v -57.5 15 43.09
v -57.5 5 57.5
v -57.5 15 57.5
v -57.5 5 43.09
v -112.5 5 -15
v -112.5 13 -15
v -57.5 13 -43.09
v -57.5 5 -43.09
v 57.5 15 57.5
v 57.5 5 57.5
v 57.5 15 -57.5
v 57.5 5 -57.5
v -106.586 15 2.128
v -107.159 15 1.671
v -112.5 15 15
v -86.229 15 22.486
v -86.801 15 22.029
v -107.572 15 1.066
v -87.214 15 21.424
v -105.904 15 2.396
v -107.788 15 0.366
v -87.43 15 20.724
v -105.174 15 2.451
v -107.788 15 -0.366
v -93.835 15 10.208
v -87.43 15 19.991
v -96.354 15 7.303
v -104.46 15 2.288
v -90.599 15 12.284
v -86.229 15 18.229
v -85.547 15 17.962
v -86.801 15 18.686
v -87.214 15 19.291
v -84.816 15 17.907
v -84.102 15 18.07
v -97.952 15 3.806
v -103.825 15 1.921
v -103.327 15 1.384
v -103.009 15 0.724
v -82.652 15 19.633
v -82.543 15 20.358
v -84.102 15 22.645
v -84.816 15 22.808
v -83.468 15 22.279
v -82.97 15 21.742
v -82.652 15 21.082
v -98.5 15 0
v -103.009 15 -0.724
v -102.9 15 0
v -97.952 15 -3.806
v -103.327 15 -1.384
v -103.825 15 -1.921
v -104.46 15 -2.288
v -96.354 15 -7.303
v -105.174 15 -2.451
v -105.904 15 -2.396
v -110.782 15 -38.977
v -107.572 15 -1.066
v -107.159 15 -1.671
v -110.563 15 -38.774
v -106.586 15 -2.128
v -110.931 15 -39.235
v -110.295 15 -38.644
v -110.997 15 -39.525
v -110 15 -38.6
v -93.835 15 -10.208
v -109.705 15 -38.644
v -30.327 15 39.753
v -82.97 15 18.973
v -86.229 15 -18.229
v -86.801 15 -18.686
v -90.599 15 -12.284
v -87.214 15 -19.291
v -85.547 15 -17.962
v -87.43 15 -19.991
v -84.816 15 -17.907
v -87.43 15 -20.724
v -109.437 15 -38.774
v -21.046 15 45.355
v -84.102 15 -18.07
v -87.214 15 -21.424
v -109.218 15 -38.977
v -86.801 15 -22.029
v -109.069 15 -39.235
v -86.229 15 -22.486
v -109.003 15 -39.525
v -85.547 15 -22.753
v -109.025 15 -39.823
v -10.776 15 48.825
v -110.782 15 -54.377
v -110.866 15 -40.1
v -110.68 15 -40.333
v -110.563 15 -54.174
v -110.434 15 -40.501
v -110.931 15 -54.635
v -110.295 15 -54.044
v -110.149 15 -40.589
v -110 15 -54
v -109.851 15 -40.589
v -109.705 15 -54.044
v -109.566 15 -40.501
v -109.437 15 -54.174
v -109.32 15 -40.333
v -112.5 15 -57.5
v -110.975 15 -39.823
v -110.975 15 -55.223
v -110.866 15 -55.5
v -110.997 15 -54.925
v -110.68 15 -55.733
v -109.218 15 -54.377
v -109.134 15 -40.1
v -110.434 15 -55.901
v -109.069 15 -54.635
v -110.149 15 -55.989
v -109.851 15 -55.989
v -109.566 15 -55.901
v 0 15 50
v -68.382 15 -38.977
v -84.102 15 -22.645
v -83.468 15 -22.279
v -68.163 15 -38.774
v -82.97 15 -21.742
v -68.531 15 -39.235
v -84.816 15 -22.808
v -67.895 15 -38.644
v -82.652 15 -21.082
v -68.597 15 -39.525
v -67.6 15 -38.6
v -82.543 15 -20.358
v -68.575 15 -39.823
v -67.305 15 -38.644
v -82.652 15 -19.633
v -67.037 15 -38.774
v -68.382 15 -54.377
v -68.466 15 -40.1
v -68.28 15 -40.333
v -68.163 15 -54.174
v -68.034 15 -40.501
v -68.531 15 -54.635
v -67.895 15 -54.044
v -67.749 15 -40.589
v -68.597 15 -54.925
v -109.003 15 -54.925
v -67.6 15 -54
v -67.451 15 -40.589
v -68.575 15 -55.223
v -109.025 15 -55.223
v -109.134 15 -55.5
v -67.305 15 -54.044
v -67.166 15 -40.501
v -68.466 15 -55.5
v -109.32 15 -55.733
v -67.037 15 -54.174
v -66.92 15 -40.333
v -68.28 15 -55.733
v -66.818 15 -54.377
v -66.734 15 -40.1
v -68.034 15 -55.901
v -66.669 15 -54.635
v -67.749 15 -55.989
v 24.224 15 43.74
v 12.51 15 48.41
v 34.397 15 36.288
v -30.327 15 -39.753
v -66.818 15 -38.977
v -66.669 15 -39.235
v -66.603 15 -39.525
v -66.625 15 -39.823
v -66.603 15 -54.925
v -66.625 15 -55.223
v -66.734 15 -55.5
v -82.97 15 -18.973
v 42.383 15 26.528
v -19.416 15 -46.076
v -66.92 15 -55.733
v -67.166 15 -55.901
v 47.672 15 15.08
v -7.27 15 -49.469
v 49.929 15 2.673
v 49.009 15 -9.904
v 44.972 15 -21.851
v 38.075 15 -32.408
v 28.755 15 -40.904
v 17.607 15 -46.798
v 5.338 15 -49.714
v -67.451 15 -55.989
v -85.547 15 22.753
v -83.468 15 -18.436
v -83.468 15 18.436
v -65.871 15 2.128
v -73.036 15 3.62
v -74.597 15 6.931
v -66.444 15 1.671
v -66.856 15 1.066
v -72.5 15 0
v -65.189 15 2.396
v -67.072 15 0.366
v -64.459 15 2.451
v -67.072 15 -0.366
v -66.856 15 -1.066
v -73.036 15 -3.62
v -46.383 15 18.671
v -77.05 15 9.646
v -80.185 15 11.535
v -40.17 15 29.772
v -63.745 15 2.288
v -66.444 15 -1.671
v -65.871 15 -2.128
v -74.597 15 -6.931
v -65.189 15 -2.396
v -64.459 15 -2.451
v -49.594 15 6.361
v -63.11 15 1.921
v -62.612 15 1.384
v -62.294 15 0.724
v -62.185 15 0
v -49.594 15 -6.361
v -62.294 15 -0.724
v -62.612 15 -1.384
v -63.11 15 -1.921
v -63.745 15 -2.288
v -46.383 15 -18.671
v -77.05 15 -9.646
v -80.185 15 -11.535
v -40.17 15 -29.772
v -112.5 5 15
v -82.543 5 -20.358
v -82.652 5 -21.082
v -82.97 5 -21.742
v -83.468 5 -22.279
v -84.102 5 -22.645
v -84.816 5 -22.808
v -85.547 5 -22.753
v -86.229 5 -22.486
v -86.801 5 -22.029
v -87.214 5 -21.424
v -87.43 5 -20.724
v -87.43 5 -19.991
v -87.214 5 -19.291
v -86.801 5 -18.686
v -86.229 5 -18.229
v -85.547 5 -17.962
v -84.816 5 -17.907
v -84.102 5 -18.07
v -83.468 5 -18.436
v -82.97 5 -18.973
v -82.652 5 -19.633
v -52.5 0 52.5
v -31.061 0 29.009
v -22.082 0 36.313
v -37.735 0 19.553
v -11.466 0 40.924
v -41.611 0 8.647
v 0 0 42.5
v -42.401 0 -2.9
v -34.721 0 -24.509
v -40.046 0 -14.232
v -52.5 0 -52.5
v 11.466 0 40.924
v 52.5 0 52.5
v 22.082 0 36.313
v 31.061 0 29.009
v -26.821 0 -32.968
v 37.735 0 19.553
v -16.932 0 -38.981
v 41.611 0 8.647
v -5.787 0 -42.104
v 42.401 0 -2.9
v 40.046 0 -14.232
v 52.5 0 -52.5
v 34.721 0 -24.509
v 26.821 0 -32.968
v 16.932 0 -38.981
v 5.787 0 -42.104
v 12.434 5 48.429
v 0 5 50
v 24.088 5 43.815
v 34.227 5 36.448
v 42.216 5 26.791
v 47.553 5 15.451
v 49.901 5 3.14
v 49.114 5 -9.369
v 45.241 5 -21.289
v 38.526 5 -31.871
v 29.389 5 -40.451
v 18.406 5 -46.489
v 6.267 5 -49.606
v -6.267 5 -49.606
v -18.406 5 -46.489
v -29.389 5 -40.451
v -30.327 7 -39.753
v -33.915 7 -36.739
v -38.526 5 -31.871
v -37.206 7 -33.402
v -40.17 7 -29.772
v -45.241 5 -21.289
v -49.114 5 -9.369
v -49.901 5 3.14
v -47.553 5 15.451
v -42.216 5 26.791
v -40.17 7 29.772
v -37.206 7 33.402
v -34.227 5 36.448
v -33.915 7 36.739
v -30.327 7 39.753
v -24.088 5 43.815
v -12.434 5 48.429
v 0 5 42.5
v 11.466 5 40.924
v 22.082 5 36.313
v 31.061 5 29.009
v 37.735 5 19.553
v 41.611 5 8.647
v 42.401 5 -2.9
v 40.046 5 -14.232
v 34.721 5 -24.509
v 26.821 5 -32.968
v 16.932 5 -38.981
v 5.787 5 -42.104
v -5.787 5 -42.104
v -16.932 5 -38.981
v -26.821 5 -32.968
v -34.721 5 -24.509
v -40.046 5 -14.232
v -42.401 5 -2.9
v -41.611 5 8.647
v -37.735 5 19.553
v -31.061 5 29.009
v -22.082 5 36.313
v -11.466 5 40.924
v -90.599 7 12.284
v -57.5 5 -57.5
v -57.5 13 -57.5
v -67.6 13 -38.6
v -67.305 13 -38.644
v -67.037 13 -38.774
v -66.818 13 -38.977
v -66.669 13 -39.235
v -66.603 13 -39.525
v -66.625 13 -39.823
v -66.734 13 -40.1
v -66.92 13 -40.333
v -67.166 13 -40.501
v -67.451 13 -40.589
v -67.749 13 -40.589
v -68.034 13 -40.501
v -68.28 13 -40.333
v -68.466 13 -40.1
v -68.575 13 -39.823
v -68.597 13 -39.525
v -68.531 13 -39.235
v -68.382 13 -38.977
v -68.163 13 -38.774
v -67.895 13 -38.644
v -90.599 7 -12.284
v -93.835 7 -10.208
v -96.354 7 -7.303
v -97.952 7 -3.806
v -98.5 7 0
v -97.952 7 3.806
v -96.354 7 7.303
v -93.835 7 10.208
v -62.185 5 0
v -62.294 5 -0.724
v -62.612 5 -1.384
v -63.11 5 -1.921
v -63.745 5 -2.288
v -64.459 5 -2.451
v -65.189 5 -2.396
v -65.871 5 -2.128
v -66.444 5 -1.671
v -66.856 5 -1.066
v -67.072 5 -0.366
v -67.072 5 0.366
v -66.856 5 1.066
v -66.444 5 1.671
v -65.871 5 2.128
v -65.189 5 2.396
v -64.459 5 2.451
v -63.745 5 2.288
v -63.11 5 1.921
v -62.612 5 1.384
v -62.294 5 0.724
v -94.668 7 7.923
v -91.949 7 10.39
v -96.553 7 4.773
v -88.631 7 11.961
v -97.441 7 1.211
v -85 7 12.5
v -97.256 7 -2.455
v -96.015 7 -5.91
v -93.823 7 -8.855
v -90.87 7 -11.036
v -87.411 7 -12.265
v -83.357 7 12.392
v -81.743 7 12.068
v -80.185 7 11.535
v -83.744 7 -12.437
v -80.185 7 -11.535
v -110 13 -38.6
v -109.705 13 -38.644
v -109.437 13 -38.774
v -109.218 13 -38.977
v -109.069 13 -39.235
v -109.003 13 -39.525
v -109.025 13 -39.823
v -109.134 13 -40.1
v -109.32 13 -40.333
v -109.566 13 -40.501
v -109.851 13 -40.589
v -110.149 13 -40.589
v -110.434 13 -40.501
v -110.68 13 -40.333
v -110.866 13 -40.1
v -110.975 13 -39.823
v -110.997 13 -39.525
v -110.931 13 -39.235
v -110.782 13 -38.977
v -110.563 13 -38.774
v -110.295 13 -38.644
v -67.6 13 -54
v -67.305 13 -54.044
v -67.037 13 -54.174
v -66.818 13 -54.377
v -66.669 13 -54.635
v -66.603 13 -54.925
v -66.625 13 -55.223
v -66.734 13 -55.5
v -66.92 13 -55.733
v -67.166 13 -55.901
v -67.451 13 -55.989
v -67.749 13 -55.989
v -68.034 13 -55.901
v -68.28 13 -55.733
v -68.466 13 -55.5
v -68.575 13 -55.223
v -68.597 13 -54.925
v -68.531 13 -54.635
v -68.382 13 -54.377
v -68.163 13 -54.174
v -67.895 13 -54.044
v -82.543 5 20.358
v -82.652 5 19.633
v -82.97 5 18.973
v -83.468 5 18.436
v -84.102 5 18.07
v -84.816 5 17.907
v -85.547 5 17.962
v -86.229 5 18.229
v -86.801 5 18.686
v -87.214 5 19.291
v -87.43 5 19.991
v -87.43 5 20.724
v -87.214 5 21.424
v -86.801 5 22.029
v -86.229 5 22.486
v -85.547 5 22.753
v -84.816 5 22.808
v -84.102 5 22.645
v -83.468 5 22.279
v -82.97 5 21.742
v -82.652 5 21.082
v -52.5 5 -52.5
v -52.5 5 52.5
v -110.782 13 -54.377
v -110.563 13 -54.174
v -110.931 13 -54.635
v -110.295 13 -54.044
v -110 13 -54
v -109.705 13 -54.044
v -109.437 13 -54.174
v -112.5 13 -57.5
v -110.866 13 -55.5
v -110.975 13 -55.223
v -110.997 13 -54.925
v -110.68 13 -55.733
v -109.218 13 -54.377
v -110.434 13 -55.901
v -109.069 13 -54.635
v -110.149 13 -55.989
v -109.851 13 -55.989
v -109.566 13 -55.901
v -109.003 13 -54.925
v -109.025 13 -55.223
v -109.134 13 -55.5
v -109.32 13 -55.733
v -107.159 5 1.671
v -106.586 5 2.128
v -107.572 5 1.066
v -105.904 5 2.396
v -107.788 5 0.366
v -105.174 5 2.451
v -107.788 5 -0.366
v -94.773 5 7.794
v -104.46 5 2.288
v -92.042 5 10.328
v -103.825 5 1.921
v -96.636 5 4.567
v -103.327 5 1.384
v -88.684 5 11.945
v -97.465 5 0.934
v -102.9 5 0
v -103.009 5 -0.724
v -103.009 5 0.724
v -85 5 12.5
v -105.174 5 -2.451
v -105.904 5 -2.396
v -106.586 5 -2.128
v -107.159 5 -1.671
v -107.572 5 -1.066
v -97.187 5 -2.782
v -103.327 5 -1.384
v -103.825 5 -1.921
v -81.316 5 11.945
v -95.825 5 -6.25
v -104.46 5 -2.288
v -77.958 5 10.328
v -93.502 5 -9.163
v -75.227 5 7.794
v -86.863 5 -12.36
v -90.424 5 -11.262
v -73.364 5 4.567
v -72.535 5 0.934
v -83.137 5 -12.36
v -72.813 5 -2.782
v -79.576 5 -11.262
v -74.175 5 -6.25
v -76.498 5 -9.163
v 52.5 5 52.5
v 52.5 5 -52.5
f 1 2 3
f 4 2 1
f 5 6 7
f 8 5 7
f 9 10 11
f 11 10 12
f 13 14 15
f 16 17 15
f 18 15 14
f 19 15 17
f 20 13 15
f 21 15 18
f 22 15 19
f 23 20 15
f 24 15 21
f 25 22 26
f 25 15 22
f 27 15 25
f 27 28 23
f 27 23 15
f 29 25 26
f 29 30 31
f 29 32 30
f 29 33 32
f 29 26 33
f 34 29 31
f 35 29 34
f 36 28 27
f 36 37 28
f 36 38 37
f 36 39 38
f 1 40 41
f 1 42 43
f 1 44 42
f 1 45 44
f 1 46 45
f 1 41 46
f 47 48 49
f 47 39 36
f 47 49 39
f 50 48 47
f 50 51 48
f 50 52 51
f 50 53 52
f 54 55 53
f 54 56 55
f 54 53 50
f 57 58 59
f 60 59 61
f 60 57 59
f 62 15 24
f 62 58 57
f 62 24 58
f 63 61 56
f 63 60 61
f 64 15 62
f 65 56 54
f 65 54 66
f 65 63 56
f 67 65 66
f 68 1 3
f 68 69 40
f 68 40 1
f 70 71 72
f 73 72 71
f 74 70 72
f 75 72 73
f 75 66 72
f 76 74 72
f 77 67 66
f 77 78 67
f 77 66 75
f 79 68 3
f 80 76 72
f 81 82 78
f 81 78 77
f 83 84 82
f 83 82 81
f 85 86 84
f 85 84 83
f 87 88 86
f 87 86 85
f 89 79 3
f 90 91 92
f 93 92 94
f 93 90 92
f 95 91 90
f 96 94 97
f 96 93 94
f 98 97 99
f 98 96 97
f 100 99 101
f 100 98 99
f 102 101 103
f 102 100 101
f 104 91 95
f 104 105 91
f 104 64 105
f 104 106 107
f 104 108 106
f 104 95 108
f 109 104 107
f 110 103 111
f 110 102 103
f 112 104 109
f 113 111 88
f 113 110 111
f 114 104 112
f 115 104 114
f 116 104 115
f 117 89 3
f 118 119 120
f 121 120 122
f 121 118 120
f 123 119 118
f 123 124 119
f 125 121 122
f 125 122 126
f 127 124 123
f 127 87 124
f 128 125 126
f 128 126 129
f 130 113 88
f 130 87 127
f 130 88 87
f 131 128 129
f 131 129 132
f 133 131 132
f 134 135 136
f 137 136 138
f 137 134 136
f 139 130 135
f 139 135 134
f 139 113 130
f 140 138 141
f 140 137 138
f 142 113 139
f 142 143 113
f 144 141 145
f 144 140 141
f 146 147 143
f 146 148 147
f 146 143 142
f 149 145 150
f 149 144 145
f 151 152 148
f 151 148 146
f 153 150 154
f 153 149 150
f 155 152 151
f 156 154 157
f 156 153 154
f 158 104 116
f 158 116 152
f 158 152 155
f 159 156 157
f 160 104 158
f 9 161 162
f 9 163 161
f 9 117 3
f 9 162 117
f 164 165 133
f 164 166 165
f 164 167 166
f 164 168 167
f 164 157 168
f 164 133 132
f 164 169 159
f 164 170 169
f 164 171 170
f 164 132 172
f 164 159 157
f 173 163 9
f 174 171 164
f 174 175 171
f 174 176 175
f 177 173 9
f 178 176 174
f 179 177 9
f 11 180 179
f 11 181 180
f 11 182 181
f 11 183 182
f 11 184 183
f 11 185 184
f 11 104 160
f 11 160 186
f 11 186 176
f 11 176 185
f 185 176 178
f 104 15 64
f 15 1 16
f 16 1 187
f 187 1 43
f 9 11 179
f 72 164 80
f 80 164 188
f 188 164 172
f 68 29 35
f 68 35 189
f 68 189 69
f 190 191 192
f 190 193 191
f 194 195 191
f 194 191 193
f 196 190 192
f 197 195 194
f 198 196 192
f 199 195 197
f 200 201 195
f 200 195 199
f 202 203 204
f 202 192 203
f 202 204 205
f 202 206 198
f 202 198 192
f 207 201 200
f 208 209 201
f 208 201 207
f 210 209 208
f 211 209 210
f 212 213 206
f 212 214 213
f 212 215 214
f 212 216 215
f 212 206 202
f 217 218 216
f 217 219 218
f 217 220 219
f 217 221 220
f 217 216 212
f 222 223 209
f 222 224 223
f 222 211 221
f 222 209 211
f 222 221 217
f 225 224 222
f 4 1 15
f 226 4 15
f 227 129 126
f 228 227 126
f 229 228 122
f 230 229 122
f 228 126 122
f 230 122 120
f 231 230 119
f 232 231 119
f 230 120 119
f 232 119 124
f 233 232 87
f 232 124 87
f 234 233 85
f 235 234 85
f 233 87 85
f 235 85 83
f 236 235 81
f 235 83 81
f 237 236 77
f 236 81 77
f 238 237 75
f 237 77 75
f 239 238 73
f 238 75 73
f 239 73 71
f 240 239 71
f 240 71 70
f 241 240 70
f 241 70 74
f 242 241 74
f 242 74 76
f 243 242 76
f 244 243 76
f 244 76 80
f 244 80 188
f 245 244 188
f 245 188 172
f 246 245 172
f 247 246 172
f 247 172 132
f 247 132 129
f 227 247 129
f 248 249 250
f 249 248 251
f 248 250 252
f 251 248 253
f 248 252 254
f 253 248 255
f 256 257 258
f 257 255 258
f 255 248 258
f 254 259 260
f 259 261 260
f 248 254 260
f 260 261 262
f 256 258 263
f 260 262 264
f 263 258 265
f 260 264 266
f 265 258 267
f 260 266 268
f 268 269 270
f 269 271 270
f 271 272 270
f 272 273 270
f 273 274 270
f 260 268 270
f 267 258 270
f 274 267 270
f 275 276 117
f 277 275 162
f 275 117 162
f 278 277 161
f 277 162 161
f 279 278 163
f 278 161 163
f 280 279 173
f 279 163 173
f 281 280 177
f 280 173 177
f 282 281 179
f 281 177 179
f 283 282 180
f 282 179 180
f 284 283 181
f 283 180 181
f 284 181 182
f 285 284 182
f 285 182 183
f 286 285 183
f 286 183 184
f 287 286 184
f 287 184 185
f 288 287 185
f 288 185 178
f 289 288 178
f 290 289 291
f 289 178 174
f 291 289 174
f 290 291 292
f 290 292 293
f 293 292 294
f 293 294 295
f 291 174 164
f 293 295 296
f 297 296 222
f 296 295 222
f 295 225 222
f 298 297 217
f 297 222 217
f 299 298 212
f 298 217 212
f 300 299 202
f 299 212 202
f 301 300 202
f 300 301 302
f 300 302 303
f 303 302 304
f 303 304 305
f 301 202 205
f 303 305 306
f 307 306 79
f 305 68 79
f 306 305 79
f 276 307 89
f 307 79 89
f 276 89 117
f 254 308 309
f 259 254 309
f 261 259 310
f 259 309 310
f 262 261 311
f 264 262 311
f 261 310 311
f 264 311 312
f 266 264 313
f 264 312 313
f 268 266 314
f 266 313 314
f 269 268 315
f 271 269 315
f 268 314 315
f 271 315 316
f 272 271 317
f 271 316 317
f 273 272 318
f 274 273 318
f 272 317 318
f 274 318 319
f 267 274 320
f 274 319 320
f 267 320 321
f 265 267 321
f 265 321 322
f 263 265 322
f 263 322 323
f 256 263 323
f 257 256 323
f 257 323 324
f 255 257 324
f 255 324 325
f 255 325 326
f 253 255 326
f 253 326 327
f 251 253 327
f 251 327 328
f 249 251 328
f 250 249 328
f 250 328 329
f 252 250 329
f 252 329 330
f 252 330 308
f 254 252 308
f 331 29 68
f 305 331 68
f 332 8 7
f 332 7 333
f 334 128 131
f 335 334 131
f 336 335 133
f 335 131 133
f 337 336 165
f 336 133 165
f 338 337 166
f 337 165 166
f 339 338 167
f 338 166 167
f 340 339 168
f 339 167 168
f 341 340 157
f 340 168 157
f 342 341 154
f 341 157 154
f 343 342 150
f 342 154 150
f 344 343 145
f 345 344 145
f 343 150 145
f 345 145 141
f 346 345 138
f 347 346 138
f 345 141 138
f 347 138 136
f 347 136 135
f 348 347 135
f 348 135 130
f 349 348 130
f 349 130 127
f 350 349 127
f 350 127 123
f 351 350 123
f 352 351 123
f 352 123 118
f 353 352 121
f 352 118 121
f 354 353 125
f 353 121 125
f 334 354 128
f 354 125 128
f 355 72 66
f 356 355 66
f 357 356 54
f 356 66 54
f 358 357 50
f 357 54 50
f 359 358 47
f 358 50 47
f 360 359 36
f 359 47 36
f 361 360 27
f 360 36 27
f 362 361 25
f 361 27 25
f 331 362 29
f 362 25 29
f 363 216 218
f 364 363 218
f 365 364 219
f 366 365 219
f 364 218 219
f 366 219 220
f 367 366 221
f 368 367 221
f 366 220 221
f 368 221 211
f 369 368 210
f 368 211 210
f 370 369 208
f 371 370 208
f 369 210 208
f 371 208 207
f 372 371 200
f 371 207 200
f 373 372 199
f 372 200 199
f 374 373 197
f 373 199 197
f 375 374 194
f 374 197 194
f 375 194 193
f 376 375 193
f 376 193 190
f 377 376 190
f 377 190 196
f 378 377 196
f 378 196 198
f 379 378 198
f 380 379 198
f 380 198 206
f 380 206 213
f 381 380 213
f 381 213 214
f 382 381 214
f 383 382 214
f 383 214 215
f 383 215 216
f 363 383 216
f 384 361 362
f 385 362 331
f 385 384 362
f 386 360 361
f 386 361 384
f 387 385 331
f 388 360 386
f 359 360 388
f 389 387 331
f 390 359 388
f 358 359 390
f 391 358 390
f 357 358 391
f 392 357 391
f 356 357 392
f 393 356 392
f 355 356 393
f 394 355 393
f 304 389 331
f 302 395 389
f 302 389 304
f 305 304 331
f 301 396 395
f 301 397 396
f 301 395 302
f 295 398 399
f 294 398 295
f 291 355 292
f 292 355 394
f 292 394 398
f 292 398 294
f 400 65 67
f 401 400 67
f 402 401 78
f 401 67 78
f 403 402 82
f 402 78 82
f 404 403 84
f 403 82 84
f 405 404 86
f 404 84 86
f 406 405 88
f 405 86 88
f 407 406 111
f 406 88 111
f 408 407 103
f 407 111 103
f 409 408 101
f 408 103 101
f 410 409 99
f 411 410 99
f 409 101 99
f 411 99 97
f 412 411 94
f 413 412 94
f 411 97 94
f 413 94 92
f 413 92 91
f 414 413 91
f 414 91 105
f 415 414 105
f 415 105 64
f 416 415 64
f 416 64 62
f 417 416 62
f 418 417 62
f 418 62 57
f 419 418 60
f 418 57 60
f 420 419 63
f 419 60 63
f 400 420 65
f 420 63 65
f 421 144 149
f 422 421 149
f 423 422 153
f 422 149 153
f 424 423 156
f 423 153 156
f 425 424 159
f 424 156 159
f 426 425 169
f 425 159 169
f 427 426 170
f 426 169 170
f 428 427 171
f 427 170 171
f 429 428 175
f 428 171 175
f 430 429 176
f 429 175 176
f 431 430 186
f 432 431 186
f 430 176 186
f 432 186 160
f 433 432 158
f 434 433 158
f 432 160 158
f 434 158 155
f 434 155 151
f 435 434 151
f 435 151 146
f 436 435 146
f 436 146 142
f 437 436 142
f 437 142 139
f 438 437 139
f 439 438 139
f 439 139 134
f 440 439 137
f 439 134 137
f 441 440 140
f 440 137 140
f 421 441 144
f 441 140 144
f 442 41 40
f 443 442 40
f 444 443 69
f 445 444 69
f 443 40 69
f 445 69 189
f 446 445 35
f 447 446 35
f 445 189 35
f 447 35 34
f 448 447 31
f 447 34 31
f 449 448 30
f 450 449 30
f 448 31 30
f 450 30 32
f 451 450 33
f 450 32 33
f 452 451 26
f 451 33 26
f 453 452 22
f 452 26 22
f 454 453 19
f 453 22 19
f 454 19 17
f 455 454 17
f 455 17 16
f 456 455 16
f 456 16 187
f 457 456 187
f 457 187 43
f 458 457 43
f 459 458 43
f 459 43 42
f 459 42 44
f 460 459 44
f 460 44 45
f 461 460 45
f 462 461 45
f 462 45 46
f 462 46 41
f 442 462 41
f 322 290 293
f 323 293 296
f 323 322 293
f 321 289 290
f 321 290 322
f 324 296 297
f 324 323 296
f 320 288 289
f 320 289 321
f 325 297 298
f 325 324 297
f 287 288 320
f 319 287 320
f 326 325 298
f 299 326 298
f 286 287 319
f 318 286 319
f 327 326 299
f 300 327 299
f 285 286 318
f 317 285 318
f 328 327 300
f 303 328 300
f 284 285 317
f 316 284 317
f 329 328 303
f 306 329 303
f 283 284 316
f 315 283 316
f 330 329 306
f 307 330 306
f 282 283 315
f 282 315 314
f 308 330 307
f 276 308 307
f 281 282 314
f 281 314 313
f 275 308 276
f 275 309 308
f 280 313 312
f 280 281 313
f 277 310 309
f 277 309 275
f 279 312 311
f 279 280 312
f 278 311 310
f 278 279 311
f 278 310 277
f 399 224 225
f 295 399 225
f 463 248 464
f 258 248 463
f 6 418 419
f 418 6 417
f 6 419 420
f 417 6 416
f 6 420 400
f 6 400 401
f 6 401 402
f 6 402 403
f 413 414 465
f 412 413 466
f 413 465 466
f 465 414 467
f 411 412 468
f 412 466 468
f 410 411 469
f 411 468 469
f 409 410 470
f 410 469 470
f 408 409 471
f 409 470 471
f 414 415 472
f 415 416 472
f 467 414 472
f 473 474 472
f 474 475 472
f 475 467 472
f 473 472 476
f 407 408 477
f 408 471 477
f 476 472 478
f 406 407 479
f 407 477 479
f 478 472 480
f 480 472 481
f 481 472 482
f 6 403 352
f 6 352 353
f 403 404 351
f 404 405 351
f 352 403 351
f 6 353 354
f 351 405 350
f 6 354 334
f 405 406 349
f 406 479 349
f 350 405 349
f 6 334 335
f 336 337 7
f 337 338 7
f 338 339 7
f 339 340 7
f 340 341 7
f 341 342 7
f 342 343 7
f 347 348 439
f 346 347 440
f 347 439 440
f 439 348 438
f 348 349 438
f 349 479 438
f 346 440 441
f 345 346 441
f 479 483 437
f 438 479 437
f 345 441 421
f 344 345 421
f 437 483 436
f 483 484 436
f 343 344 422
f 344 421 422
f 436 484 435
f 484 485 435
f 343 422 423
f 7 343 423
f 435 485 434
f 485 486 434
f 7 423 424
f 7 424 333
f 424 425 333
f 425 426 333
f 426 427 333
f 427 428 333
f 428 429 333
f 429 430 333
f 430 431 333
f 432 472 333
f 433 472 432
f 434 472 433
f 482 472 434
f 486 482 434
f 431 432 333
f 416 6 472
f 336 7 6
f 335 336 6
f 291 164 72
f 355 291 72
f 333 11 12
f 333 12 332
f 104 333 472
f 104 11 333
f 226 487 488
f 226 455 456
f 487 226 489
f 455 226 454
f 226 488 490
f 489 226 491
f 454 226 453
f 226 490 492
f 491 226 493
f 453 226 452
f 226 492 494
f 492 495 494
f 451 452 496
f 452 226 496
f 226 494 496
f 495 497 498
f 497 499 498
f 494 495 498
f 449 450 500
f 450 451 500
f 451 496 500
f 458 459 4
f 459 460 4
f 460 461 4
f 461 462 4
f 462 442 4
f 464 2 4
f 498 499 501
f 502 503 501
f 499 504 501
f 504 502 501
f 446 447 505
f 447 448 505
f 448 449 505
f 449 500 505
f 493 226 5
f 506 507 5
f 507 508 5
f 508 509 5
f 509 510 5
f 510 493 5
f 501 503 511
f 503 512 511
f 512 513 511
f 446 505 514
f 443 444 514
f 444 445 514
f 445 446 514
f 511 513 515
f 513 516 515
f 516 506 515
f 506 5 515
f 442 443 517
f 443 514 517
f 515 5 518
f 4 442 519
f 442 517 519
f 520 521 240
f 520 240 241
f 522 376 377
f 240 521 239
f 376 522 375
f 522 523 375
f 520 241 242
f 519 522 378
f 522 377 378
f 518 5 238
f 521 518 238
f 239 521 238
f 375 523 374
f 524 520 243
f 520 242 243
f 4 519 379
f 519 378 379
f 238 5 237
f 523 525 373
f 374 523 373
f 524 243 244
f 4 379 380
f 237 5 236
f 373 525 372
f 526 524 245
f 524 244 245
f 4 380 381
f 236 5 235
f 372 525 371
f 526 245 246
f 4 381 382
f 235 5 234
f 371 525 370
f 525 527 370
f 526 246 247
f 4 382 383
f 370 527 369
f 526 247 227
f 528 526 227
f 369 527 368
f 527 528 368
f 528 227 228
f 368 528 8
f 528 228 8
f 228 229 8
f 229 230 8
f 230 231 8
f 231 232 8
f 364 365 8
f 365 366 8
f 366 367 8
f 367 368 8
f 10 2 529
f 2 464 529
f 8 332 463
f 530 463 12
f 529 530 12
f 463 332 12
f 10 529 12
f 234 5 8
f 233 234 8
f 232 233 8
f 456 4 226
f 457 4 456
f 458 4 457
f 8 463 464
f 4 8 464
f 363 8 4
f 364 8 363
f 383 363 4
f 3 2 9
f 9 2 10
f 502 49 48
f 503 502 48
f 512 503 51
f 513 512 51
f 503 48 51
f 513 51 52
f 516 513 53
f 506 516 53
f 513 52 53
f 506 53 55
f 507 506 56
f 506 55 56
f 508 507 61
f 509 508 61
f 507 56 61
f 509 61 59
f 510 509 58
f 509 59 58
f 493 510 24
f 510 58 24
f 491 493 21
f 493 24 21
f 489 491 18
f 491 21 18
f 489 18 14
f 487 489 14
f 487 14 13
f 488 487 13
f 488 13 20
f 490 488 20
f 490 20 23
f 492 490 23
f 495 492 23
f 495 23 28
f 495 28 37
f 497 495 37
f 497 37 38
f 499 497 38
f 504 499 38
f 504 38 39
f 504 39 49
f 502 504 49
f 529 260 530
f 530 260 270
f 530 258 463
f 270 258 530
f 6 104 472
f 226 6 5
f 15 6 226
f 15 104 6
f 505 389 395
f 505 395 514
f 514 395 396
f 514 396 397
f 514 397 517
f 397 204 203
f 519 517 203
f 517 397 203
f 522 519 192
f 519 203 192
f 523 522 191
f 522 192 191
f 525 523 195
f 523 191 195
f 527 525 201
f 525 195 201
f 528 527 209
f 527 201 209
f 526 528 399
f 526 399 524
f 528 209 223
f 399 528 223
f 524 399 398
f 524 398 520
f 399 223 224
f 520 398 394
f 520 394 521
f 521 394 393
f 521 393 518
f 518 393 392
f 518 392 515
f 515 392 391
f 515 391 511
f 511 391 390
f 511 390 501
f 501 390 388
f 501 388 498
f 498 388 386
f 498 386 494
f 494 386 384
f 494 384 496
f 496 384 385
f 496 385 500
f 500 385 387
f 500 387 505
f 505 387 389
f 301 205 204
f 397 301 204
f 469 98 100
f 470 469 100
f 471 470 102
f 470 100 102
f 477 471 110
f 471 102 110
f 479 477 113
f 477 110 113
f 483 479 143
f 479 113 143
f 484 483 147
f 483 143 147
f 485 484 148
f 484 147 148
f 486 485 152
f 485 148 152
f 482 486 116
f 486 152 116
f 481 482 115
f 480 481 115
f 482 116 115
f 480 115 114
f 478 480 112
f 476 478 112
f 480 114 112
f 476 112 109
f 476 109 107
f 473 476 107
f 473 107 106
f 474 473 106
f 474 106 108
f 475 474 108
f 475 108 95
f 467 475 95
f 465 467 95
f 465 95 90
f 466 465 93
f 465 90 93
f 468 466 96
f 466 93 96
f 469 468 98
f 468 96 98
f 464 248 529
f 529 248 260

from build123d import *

# Parameters (mm, degrees)
SKETCH1_W             = 105
SKETCH1_H             = 105
BOSS_EXTRUDE1_DEPTH   = 5
SKETCH2_W             = 115
SKETCH2_H             = 115
BOSS_EXTRUDE2_DEPTH   = 10
SKETCH3_R             = 42.5
CUT_EXTRUDE1_DEPTH    = 83.689177043
SKETCH4_R             = 50
CUT_EXTRUDE2_DEPTH    = 10
BOSS_EXTRUDE3_DEPTH   = 10
SKETCH6_R             = 12.5
CUT_EXTRUDE3_DEPTH    = 128.2301065
F_8_CLEARANCE_HOLE1_D = 4.9149
CUT_EXTRUDE4_DEPTH    = 8
SKETCH10_R            = 1
BOSS_EXTRUDE4_DEPTH   = 2


with BuildPart() as part:
    # Sketch1 → Boss-Extrude1 (new body)
    with BuildSketch(Plane(origin=(0, 0, 0), x_dir=(1, 0, 0), z_dir=(0, 1, 0))):
        Rectangle(SKETCH1_W, SKETCH1_H)
    extrude(amount=BOSS_EXTRUDE1_DEPTH)

    # Sketch2 → Boss-Extrude2 (add)
    with BuildSketch(Plane(origin=(0, 5, 0), x_dir=(1, 0, 0), z_dir=(0, 1, 0))):
        Rectangle(SKETCH2_W, SKETCH2_H)
    extrude(amount=BOSS_EXTRUDE2_DEPTH)

    # Sketch3 → Cut-Extrude1 (cut, through all)
    with BuildSketch(Plane(origin=(0, 15, 0), x_dir=(1, 0, 0), z_dir=(0, 1, 0))):
        with Locations(Location((0, 0, 0), (0, 0, 270))):
            Circle(SKETCH3_R)
    extrude(amount=-CUT_EXTRUDE1_DEPTH, mode=Mode.SUBTRACT)

    # Sketch4 → Cut-Extrude2 (cut)
    with BuildSketch(Plane(origin=(0, 15, 0), x_dir=(1, 0, 0), z_dir=(0, 1, 0))):
        with Locations(Location((0, 0, 0), (0, 0, 270))):
            Circle(SKETCH4_R)
    extrude(amount=-CUT_EXTRUDE2_DEPTH, mode=Mode.SUBTRACT)

    # Sketch5 → Boss-Extrude3 (add)
    with BuildSketch(Plane(origin=(0, 15, 0), x_dir=(1, 0, 0), z_dir=(0, 1, 0))):
        Polygon((-57.5, 43.090435246), (-57.5, -43.090435246), (-112.5, -15), (-112.5, 15), align=None)
    extrude(amount=-BOSS_EXTRUDE3_DEPTH)

    # Sketch6 → Cut-Extrude3 (cut, through all)
    with BuildSketch(Plane(origin=(0, 15, 0), x_dir=(1, 0, 0), z_dir=(0, 1, 0))):
        with Locations(Location((-85, 0, 0), (0, 0, 270))):
            Circle(SKETCH6_R)
    extrude(amount=-CUT_EXTRUDE3_DEPTH, mode=Mode.SUBTRACT)

    # #8 Clearance Hole1 (through all)
    with Locations(Plane(origin=(0, 5, 0), x_dir=(-1, 0, 0), z_dir=(0, -1, 0))):
        with Locations((64.64239577, 0), (85, -20.35760423), (105.35760423, 0), (85, 20.35760423)):
            Hole(F_8_CLEARANCE_HOLE1_D / 2)

    # Sketch9 → Cut-Extrude4 (cut)
    with BuildSketch(Plane(origin=(0, 15, 0), x_dir=(1, 0, 0), z_dir=(0, 1, 0))):
        with BuildLine():
            Line((-20.216911765, 44.360331138), (-90.598529412, 12.284399392))
            ThreePointArc((-90.598529412, 12.284399392), (-98.5, 0), (-90.598529412, -12.284399392))
            Line((-90.598529412, -12.284399392), (-20.216911765, -44.360331138))
            ThreePointArc((-20.216911765, -44.360331138), (-16.905258283, -43.122207068), (-18.143382353, -39.810553586))
            Line((-18.143382353, -39.810553586), (-88.525, -7.734621839))
            ThreePointArc((-88.525, -7.734621839), (-93.5, 0), (-88.525, 7.734621839))
            Line((-88.525, 7.734621839), (-18.143382353, 39.810553586))
            ThreePointArc((-18.143382353, 39.810553586), (-16.905258283, 43.122207068), (-20.216911765, 44.360331138))
        make_face()
    extrude(amount=-CUT_EXTRUDE4_DEPTH, mode=Mode.SUBTRACT)

    # Sketch10 → Boss-Extrude4 (add)
    with BuildSketch(Plane(origin=(0, 15, 0), x_dir=(1, 0, 0), z_dir=(0, 1, 0))):
        Polygon((-57.5, 57.5), (-112.5, 57.5), (-112.5, 15), (-57.5, 43.090435246), align=None)
        with Locations(Location((-67.6, 55, 0), (0, 0, 270))):
            Circle(SKETCH10_R, mode=Mode.SUBTRACT)
        with Locations(Location((-67.6, 39.6, 0), (0, 0, 270))):
            Circle(SKETCH10_R, mode=Mode.SUBTRACT)
        with Locations(Location((-110, 55, 0), (0, 0, 270))):
            Circle(SKETCH10_R, mode=Mode.SUBTRACT)
        with Locations(Location((-110, 39.6, 0), (0, 0, 270))):
            Circle(SKETCH10_R, mode=Mode.SUBTRACT)
    extrude(amount=-BOSS_EXTRUDE4_DEPTH)


solid = part.part
